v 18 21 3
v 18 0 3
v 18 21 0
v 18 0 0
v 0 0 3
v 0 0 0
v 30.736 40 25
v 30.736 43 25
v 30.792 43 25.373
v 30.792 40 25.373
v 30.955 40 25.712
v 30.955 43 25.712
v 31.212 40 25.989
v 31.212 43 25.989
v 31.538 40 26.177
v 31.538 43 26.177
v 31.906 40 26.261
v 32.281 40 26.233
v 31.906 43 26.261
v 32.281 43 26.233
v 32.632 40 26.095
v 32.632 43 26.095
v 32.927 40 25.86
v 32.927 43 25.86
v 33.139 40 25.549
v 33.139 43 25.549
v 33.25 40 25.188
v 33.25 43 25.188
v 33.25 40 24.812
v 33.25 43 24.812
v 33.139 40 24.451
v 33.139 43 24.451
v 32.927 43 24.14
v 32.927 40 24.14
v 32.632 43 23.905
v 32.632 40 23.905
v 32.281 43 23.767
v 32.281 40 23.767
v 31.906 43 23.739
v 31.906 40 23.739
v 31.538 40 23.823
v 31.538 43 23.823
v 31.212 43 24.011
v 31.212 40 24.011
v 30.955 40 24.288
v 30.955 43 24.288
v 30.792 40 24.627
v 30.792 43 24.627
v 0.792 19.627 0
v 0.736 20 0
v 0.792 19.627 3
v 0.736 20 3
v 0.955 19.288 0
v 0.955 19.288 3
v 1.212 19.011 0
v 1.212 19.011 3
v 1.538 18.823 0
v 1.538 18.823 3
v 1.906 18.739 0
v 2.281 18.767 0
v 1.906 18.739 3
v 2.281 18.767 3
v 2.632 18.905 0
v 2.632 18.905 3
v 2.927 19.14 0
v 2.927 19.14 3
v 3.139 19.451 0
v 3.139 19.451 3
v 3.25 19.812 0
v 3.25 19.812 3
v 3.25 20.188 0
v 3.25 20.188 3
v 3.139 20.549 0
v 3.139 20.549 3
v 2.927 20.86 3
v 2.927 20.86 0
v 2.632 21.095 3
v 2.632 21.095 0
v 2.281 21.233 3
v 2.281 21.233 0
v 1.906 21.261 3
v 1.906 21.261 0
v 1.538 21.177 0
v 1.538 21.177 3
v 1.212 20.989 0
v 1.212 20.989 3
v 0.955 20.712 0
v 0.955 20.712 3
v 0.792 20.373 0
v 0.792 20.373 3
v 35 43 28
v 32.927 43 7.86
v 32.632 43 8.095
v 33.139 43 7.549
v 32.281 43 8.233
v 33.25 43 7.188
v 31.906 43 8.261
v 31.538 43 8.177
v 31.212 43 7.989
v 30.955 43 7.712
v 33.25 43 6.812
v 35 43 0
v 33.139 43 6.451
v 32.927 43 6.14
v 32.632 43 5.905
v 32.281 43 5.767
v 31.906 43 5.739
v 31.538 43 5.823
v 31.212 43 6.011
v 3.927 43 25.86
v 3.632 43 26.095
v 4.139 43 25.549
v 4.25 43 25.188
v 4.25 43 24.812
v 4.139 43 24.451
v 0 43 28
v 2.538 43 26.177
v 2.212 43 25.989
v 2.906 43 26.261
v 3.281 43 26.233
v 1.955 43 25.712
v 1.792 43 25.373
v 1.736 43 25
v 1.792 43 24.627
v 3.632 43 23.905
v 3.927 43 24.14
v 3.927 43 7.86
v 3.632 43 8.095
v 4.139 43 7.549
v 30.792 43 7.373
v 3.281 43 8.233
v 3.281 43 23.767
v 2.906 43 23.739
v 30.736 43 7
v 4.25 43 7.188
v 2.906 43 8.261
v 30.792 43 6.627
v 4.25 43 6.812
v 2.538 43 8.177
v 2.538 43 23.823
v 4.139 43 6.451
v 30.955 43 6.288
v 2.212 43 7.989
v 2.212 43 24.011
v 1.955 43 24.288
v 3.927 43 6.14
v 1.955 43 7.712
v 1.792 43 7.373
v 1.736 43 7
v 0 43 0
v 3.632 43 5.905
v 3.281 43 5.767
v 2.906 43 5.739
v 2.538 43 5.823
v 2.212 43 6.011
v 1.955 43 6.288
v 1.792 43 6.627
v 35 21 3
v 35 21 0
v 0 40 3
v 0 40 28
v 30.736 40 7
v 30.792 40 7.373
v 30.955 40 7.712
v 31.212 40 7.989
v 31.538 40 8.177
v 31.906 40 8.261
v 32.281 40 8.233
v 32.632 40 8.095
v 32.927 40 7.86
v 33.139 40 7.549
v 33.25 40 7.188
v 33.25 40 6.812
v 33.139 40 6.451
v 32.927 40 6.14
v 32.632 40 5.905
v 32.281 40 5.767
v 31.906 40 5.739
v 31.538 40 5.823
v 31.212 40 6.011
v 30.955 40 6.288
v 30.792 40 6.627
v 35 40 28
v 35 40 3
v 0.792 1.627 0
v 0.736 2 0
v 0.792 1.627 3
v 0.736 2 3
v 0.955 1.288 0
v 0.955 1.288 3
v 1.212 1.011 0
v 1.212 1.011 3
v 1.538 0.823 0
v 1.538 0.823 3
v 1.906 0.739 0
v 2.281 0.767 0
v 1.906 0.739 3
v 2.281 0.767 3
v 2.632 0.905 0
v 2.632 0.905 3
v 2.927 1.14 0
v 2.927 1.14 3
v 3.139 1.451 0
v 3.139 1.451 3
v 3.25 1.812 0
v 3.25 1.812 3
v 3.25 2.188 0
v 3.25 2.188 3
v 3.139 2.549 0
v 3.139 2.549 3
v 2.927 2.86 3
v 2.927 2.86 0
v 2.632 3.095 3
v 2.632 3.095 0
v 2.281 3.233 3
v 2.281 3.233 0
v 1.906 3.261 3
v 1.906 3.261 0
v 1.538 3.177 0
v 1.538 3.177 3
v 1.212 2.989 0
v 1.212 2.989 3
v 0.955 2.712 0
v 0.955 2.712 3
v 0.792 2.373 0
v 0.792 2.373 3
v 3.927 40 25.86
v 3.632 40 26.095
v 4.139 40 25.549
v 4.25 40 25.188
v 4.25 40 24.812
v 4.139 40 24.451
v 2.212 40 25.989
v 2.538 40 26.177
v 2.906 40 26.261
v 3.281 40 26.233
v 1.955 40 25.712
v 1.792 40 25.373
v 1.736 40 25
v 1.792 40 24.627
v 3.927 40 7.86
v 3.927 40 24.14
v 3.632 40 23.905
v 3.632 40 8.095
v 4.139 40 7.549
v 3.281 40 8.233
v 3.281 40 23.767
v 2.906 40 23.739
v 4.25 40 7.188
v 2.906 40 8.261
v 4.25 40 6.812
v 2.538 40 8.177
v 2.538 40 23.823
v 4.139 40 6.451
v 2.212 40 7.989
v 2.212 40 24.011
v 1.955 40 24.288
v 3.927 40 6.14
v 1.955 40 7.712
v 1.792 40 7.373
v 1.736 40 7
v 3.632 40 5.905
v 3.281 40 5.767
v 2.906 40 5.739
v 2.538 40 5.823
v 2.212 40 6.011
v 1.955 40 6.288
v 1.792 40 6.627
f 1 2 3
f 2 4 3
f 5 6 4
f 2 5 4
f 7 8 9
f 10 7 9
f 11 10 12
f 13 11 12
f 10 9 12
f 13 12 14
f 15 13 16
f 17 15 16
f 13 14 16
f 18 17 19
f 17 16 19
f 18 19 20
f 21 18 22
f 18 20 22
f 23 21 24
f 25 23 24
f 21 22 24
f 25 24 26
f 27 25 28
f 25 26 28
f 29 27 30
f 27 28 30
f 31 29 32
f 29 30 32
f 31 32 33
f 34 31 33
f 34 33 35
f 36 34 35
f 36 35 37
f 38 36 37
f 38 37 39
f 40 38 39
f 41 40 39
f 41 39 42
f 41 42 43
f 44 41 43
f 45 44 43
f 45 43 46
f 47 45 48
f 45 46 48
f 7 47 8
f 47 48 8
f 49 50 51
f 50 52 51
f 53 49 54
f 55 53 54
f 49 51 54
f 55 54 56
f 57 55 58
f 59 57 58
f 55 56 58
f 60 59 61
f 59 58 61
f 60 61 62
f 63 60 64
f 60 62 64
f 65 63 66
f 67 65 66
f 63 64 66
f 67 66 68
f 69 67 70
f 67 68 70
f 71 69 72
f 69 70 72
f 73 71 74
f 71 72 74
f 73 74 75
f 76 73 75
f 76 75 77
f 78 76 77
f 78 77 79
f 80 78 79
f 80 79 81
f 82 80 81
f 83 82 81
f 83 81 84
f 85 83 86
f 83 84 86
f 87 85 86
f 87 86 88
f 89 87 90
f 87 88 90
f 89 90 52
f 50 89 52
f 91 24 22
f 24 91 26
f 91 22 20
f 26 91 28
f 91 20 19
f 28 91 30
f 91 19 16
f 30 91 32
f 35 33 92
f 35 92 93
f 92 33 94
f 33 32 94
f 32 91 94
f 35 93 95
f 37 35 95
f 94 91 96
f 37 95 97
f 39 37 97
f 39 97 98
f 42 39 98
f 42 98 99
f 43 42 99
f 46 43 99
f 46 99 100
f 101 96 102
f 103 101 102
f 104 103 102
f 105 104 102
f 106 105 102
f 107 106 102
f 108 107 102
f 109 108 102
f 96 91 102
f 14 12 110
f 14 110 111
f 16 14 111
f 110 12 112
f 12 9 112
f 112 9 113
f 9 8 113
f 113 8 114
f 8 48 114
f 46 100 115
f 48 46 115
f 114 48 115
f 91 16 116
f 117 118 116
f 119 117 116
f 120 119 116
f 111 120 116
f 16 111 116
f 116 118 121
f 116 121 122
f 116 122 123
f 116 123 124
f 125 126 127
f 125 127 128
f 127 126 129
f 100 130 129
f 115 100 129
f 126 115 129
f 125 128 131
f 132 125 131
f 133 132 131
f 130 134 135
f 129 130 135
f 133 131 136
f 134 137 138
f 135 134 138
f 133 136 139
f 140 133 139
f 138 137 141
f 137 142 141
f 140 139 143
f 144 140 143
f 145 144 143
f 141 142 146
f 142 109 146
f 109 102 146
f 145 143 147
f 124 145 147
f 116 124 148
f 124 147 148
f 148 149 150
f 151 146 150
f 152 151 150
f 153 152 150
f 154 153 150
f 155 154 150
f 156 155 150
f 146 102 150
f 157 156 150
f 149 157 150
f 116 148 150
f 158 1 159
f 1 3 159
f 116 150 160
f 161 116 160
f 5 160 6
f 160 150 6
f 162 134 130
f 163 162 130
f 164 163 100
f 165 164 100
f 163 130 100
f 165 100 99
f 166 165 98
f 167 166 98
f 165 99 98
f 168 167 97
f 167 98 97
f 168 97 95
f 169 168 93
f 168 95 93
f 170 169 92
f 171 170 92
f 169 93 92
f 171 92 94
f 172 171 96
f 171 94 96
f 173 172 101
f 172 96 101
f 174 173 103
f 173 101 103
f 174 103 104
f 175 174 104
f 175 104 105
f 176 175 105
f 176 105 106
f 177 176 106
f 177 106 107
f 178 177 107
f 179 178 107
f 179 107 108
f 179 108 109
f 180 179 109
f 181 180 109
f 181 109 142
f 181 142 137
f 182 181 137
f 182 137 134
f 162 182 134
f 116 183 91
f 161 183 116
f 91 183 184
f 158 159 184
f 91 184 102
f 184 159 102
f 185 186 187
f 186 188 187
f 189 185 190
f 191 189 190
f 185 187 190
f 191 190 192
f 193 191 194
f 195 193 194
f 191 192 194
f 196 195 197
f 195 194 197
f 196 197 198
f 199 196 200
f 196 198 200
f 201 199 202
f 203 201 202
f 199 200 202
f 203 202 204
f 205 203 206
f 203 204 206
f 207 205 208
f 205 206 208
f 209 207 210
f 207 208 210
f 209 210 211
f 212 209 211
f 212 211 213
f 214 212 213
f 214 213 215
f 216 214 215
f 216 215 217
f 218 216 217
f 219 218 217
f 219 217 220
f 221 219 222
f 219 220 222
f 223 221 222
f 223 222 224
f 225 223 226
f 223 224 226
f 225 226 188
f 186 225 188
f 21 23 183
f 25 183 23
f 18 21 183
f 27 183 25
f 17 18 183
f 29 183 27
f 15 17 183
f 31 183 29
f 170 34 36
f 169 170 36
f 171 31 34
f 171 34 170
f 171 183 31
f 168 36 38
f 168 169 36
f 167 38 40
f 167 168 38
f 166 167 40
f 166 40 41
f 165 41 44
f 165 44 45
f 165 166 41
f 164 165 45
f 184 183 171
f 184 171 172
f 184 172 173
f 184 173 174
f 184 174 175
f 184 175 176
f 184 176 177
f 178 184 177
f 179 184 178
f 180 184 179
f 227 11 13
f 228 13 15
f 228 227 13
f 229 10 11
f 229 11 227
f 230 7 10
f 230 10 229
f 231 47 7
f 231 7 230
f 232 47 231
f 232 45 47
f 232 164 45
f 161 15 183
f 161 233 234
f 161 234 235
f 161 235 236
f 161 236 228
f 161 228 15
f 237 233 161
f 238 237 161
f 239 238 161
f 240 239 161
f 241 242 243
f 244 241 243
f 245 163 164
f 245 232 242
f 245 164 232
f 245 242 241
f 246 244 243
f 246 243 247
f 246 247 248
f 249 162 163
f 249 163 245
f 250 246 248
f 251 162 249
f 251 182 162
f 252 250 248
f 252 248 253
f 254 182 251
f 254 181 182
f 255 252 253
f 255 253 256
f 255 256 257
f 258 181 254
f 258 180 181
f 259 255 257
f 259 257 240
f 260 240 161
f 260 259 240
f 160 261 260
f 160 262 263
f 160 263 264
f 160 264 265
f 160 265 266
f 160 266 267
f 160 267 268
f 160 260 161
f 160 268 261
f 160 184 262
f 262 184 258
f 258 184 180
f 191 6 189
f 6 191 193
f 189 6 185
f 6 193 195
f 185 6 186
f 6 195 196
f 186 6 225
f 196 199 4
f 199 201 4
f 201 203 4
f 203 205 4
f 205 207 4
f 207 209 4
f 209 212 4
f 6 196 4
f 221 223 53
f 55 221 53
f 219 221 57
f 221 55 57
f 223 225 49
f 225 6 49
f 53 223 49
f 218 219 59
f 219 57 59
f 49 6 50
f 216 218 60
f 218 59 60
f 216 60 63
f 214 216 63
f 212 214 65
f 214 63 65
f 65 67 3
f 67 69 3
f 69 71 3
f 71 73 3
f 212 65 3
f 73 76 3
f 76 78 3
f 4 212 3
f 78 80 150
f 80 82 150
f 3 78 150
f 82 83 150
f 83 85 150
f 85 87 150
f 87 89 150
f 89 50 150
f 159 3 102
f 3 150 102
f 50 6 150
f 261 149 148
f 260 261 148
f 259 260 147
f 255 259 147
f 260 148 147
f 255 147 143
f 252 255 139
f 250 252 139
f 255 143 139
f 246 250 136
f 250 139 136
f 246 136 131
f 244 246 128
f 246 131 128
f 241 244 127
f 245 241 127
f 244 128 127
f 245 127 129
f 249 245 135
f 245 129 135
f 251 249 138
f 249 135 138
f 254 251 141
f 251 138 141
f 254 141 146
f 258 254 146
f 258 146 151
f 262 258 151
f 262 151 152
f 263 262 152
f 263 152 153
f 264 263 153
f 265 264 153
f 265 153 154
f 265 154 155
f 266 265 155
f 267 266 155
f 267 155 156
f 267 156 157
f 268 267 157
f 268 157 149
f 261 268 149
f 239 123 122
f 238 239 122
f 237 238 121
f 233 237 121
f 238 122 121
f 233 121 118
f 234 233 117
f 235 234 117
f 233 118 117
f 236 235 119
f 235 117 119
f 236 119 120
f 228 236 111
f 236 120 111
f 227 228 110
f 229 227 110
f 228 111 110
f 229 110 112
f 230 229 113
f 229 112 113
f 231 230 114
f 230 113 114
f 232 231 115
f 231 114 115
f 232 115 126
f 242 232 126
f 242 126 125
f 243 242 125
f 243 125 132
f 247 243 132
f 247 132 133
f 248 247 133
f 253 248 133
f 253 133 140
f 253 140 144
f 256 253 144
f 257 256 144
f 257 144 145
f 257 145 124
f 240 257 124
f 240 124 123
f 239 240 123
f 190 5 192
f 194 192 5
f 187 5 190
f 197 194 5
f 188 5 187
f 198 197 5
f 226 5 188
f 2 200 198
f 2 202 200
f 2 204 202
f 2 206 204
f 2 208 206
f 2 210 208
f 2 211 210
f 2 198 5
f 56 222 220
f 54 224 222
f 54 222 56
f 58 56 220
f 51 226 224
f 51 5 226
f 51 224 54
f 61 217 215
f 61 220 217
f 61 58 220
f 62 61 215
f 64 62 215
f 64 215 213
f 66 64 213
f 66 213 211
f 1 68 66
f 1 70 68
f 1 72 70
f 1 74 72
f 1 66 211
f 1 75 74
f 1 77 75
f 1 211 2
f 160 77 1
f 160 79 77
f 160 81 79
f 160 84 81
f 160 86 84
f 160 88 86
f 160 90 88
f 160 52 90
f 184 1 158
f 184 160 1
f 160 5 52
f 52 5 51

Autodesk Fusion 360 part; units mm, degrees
sketch "Sketch1" plane through (0, 0, 0) normal (0, 0, 1) x (1, 0, 0)
  line L0 (0, 0) -> (18, 0)
  line L1 (18, 0) -> (18, 21)
  line L2 (18, 21) -> (0, 21)
  line L3 (0, 21) -> (0, 0)
  line L4 (0, 21) -> (35, 21)
  line L5 (35, 21) -> (35, 43)
  line L6 (35, 43) -> (0, 43)
  line L7 (0, 43) -> (0, 21)
  dimension "d1" = 18
  dimension "d2" = 21
  dimension "d18" = 22
extrude "Extrude1" add sketch "Sketch1" along normal blind 3
sketch "Sketch2" plane through (0, 0, 3) normal (0, 0, 1) x (-1, 0, 0)
  line L0 (0, -43) -> (0, 0)
  line L1 (0, 0) -> (-18, 0)
  line L2 (-18, 0) -> (-18, -21)
  line L3 (-18, -21) -> (-35, -21)
  line L4 (-35, -21) -> (-35, -43)
  line L5 (-35, -43) -> (0, -43)
  line L6 (0, -43) -> (-35, -43)
  line L7 (-35, -43) -> (-35, -40)
  line L8 (-35, -40) -> (0, -40)
  line L9 (0, -40) -> (0, -43)
  dimension "d5" = 3
extrude "Extrude2" add sketch "Sketch2" along normal blind 25 contours L0 L4 L5 L6 L7 L8 L9
sketch "Sketch3" plane through (0, 0, 3) normal (0, 0, 1) x (-1, 0, 0)
  line L0 (-35, -40) -> (0, -40)
  line L1 (0, -40) -> (0, 0)
  line L2 (0, 0) -> (-18, 0)
  line L3 (-18, 0) -> (-18, -21)
  line L4 (-18, -21) -> (-35, -21)
  line L5 (-35, -21) -> (-35, -40)
  circle A0 centre (-2, -2) radius 1.5
  circle A1 centre (-2, -20) radius 1.5
  dimension "d8" = 3
  dimension "d9" = 3
extrude "Extrude3" cut sketch "Sketch3" against normal blind 4 contours A0 | A1
sketch "Sketch4" plane through (0, 43, 0) normal (0, 1, 0) x (-1, 0, 0)
  line L0 (-35, 0) -> (0, 0)
  line L1 (0, 0) -> (0, 28)
  line L2 (0, 28) -> (-35, 28)
  line L3 (-35, 28) -> (-35, 0)
  circle A0 centre (-32, 25) radius 1.5
  circle A1 centre (-3, 25) radius 1.5
  circle A2 centre (-3, 7) radius 1.5
  circle A3 centre (-32, 7) radius 1.5
  dimension "d12" = 3
  dimension "d13" = 3
  dimension "d14" = 3
  dimension "d15" = 3
extrude "Extrude4" cut sketch "Sketch4" against normal blind 4 contours A0 | A1 | A2 | A3
thread "Thread1" "ISO Metric profile 3.0 M3x0.5 6H" major diameter 3.086 minor diameter 2.529 pitch 0.5 angle 60 resizes the face on face at (1.5075, 42, 24.8506)
thread "Thread2" "ISO Metric profile 3.0 M3x0.5 6H" major diameter 3.086 minor diameter 2.529 pitch 0.5 angle 60 resizes the face on face at (1.5075, 42, 6.8506)
thread "Thread3" "ISO Metric profile 3.0 M3x0.5 6H" major diameter 3.086 minor diameter 2.529 pitch 0.5 angle 60 resizes the face on face at (32.6843, 42, 23.6652)
thread "Thread4" "ISO Metric profile 3.0 M3x0.5 6H" major diameter 3.086 minor diameter 2.529 pitch 0.5 angle 60 resizes the face on face at (32.6843, 42, 5.6652)
thread "Thread5" "ISO Metric profile 3.0 M3x0.5 6H" major diameter 3.086 minor diameter 2.529 pitch 0.5 angle 60 resizes the face on face at (0.5075, 20.1494, 2)
thread "Thread6" "ISO Metric profile 3.0 M3x0.5 6H" major diameter 3.086 minor diameter 2.529 pitch 0.5 angle 60 resizes the face on face at (0.5075, 2.1494, 2)
